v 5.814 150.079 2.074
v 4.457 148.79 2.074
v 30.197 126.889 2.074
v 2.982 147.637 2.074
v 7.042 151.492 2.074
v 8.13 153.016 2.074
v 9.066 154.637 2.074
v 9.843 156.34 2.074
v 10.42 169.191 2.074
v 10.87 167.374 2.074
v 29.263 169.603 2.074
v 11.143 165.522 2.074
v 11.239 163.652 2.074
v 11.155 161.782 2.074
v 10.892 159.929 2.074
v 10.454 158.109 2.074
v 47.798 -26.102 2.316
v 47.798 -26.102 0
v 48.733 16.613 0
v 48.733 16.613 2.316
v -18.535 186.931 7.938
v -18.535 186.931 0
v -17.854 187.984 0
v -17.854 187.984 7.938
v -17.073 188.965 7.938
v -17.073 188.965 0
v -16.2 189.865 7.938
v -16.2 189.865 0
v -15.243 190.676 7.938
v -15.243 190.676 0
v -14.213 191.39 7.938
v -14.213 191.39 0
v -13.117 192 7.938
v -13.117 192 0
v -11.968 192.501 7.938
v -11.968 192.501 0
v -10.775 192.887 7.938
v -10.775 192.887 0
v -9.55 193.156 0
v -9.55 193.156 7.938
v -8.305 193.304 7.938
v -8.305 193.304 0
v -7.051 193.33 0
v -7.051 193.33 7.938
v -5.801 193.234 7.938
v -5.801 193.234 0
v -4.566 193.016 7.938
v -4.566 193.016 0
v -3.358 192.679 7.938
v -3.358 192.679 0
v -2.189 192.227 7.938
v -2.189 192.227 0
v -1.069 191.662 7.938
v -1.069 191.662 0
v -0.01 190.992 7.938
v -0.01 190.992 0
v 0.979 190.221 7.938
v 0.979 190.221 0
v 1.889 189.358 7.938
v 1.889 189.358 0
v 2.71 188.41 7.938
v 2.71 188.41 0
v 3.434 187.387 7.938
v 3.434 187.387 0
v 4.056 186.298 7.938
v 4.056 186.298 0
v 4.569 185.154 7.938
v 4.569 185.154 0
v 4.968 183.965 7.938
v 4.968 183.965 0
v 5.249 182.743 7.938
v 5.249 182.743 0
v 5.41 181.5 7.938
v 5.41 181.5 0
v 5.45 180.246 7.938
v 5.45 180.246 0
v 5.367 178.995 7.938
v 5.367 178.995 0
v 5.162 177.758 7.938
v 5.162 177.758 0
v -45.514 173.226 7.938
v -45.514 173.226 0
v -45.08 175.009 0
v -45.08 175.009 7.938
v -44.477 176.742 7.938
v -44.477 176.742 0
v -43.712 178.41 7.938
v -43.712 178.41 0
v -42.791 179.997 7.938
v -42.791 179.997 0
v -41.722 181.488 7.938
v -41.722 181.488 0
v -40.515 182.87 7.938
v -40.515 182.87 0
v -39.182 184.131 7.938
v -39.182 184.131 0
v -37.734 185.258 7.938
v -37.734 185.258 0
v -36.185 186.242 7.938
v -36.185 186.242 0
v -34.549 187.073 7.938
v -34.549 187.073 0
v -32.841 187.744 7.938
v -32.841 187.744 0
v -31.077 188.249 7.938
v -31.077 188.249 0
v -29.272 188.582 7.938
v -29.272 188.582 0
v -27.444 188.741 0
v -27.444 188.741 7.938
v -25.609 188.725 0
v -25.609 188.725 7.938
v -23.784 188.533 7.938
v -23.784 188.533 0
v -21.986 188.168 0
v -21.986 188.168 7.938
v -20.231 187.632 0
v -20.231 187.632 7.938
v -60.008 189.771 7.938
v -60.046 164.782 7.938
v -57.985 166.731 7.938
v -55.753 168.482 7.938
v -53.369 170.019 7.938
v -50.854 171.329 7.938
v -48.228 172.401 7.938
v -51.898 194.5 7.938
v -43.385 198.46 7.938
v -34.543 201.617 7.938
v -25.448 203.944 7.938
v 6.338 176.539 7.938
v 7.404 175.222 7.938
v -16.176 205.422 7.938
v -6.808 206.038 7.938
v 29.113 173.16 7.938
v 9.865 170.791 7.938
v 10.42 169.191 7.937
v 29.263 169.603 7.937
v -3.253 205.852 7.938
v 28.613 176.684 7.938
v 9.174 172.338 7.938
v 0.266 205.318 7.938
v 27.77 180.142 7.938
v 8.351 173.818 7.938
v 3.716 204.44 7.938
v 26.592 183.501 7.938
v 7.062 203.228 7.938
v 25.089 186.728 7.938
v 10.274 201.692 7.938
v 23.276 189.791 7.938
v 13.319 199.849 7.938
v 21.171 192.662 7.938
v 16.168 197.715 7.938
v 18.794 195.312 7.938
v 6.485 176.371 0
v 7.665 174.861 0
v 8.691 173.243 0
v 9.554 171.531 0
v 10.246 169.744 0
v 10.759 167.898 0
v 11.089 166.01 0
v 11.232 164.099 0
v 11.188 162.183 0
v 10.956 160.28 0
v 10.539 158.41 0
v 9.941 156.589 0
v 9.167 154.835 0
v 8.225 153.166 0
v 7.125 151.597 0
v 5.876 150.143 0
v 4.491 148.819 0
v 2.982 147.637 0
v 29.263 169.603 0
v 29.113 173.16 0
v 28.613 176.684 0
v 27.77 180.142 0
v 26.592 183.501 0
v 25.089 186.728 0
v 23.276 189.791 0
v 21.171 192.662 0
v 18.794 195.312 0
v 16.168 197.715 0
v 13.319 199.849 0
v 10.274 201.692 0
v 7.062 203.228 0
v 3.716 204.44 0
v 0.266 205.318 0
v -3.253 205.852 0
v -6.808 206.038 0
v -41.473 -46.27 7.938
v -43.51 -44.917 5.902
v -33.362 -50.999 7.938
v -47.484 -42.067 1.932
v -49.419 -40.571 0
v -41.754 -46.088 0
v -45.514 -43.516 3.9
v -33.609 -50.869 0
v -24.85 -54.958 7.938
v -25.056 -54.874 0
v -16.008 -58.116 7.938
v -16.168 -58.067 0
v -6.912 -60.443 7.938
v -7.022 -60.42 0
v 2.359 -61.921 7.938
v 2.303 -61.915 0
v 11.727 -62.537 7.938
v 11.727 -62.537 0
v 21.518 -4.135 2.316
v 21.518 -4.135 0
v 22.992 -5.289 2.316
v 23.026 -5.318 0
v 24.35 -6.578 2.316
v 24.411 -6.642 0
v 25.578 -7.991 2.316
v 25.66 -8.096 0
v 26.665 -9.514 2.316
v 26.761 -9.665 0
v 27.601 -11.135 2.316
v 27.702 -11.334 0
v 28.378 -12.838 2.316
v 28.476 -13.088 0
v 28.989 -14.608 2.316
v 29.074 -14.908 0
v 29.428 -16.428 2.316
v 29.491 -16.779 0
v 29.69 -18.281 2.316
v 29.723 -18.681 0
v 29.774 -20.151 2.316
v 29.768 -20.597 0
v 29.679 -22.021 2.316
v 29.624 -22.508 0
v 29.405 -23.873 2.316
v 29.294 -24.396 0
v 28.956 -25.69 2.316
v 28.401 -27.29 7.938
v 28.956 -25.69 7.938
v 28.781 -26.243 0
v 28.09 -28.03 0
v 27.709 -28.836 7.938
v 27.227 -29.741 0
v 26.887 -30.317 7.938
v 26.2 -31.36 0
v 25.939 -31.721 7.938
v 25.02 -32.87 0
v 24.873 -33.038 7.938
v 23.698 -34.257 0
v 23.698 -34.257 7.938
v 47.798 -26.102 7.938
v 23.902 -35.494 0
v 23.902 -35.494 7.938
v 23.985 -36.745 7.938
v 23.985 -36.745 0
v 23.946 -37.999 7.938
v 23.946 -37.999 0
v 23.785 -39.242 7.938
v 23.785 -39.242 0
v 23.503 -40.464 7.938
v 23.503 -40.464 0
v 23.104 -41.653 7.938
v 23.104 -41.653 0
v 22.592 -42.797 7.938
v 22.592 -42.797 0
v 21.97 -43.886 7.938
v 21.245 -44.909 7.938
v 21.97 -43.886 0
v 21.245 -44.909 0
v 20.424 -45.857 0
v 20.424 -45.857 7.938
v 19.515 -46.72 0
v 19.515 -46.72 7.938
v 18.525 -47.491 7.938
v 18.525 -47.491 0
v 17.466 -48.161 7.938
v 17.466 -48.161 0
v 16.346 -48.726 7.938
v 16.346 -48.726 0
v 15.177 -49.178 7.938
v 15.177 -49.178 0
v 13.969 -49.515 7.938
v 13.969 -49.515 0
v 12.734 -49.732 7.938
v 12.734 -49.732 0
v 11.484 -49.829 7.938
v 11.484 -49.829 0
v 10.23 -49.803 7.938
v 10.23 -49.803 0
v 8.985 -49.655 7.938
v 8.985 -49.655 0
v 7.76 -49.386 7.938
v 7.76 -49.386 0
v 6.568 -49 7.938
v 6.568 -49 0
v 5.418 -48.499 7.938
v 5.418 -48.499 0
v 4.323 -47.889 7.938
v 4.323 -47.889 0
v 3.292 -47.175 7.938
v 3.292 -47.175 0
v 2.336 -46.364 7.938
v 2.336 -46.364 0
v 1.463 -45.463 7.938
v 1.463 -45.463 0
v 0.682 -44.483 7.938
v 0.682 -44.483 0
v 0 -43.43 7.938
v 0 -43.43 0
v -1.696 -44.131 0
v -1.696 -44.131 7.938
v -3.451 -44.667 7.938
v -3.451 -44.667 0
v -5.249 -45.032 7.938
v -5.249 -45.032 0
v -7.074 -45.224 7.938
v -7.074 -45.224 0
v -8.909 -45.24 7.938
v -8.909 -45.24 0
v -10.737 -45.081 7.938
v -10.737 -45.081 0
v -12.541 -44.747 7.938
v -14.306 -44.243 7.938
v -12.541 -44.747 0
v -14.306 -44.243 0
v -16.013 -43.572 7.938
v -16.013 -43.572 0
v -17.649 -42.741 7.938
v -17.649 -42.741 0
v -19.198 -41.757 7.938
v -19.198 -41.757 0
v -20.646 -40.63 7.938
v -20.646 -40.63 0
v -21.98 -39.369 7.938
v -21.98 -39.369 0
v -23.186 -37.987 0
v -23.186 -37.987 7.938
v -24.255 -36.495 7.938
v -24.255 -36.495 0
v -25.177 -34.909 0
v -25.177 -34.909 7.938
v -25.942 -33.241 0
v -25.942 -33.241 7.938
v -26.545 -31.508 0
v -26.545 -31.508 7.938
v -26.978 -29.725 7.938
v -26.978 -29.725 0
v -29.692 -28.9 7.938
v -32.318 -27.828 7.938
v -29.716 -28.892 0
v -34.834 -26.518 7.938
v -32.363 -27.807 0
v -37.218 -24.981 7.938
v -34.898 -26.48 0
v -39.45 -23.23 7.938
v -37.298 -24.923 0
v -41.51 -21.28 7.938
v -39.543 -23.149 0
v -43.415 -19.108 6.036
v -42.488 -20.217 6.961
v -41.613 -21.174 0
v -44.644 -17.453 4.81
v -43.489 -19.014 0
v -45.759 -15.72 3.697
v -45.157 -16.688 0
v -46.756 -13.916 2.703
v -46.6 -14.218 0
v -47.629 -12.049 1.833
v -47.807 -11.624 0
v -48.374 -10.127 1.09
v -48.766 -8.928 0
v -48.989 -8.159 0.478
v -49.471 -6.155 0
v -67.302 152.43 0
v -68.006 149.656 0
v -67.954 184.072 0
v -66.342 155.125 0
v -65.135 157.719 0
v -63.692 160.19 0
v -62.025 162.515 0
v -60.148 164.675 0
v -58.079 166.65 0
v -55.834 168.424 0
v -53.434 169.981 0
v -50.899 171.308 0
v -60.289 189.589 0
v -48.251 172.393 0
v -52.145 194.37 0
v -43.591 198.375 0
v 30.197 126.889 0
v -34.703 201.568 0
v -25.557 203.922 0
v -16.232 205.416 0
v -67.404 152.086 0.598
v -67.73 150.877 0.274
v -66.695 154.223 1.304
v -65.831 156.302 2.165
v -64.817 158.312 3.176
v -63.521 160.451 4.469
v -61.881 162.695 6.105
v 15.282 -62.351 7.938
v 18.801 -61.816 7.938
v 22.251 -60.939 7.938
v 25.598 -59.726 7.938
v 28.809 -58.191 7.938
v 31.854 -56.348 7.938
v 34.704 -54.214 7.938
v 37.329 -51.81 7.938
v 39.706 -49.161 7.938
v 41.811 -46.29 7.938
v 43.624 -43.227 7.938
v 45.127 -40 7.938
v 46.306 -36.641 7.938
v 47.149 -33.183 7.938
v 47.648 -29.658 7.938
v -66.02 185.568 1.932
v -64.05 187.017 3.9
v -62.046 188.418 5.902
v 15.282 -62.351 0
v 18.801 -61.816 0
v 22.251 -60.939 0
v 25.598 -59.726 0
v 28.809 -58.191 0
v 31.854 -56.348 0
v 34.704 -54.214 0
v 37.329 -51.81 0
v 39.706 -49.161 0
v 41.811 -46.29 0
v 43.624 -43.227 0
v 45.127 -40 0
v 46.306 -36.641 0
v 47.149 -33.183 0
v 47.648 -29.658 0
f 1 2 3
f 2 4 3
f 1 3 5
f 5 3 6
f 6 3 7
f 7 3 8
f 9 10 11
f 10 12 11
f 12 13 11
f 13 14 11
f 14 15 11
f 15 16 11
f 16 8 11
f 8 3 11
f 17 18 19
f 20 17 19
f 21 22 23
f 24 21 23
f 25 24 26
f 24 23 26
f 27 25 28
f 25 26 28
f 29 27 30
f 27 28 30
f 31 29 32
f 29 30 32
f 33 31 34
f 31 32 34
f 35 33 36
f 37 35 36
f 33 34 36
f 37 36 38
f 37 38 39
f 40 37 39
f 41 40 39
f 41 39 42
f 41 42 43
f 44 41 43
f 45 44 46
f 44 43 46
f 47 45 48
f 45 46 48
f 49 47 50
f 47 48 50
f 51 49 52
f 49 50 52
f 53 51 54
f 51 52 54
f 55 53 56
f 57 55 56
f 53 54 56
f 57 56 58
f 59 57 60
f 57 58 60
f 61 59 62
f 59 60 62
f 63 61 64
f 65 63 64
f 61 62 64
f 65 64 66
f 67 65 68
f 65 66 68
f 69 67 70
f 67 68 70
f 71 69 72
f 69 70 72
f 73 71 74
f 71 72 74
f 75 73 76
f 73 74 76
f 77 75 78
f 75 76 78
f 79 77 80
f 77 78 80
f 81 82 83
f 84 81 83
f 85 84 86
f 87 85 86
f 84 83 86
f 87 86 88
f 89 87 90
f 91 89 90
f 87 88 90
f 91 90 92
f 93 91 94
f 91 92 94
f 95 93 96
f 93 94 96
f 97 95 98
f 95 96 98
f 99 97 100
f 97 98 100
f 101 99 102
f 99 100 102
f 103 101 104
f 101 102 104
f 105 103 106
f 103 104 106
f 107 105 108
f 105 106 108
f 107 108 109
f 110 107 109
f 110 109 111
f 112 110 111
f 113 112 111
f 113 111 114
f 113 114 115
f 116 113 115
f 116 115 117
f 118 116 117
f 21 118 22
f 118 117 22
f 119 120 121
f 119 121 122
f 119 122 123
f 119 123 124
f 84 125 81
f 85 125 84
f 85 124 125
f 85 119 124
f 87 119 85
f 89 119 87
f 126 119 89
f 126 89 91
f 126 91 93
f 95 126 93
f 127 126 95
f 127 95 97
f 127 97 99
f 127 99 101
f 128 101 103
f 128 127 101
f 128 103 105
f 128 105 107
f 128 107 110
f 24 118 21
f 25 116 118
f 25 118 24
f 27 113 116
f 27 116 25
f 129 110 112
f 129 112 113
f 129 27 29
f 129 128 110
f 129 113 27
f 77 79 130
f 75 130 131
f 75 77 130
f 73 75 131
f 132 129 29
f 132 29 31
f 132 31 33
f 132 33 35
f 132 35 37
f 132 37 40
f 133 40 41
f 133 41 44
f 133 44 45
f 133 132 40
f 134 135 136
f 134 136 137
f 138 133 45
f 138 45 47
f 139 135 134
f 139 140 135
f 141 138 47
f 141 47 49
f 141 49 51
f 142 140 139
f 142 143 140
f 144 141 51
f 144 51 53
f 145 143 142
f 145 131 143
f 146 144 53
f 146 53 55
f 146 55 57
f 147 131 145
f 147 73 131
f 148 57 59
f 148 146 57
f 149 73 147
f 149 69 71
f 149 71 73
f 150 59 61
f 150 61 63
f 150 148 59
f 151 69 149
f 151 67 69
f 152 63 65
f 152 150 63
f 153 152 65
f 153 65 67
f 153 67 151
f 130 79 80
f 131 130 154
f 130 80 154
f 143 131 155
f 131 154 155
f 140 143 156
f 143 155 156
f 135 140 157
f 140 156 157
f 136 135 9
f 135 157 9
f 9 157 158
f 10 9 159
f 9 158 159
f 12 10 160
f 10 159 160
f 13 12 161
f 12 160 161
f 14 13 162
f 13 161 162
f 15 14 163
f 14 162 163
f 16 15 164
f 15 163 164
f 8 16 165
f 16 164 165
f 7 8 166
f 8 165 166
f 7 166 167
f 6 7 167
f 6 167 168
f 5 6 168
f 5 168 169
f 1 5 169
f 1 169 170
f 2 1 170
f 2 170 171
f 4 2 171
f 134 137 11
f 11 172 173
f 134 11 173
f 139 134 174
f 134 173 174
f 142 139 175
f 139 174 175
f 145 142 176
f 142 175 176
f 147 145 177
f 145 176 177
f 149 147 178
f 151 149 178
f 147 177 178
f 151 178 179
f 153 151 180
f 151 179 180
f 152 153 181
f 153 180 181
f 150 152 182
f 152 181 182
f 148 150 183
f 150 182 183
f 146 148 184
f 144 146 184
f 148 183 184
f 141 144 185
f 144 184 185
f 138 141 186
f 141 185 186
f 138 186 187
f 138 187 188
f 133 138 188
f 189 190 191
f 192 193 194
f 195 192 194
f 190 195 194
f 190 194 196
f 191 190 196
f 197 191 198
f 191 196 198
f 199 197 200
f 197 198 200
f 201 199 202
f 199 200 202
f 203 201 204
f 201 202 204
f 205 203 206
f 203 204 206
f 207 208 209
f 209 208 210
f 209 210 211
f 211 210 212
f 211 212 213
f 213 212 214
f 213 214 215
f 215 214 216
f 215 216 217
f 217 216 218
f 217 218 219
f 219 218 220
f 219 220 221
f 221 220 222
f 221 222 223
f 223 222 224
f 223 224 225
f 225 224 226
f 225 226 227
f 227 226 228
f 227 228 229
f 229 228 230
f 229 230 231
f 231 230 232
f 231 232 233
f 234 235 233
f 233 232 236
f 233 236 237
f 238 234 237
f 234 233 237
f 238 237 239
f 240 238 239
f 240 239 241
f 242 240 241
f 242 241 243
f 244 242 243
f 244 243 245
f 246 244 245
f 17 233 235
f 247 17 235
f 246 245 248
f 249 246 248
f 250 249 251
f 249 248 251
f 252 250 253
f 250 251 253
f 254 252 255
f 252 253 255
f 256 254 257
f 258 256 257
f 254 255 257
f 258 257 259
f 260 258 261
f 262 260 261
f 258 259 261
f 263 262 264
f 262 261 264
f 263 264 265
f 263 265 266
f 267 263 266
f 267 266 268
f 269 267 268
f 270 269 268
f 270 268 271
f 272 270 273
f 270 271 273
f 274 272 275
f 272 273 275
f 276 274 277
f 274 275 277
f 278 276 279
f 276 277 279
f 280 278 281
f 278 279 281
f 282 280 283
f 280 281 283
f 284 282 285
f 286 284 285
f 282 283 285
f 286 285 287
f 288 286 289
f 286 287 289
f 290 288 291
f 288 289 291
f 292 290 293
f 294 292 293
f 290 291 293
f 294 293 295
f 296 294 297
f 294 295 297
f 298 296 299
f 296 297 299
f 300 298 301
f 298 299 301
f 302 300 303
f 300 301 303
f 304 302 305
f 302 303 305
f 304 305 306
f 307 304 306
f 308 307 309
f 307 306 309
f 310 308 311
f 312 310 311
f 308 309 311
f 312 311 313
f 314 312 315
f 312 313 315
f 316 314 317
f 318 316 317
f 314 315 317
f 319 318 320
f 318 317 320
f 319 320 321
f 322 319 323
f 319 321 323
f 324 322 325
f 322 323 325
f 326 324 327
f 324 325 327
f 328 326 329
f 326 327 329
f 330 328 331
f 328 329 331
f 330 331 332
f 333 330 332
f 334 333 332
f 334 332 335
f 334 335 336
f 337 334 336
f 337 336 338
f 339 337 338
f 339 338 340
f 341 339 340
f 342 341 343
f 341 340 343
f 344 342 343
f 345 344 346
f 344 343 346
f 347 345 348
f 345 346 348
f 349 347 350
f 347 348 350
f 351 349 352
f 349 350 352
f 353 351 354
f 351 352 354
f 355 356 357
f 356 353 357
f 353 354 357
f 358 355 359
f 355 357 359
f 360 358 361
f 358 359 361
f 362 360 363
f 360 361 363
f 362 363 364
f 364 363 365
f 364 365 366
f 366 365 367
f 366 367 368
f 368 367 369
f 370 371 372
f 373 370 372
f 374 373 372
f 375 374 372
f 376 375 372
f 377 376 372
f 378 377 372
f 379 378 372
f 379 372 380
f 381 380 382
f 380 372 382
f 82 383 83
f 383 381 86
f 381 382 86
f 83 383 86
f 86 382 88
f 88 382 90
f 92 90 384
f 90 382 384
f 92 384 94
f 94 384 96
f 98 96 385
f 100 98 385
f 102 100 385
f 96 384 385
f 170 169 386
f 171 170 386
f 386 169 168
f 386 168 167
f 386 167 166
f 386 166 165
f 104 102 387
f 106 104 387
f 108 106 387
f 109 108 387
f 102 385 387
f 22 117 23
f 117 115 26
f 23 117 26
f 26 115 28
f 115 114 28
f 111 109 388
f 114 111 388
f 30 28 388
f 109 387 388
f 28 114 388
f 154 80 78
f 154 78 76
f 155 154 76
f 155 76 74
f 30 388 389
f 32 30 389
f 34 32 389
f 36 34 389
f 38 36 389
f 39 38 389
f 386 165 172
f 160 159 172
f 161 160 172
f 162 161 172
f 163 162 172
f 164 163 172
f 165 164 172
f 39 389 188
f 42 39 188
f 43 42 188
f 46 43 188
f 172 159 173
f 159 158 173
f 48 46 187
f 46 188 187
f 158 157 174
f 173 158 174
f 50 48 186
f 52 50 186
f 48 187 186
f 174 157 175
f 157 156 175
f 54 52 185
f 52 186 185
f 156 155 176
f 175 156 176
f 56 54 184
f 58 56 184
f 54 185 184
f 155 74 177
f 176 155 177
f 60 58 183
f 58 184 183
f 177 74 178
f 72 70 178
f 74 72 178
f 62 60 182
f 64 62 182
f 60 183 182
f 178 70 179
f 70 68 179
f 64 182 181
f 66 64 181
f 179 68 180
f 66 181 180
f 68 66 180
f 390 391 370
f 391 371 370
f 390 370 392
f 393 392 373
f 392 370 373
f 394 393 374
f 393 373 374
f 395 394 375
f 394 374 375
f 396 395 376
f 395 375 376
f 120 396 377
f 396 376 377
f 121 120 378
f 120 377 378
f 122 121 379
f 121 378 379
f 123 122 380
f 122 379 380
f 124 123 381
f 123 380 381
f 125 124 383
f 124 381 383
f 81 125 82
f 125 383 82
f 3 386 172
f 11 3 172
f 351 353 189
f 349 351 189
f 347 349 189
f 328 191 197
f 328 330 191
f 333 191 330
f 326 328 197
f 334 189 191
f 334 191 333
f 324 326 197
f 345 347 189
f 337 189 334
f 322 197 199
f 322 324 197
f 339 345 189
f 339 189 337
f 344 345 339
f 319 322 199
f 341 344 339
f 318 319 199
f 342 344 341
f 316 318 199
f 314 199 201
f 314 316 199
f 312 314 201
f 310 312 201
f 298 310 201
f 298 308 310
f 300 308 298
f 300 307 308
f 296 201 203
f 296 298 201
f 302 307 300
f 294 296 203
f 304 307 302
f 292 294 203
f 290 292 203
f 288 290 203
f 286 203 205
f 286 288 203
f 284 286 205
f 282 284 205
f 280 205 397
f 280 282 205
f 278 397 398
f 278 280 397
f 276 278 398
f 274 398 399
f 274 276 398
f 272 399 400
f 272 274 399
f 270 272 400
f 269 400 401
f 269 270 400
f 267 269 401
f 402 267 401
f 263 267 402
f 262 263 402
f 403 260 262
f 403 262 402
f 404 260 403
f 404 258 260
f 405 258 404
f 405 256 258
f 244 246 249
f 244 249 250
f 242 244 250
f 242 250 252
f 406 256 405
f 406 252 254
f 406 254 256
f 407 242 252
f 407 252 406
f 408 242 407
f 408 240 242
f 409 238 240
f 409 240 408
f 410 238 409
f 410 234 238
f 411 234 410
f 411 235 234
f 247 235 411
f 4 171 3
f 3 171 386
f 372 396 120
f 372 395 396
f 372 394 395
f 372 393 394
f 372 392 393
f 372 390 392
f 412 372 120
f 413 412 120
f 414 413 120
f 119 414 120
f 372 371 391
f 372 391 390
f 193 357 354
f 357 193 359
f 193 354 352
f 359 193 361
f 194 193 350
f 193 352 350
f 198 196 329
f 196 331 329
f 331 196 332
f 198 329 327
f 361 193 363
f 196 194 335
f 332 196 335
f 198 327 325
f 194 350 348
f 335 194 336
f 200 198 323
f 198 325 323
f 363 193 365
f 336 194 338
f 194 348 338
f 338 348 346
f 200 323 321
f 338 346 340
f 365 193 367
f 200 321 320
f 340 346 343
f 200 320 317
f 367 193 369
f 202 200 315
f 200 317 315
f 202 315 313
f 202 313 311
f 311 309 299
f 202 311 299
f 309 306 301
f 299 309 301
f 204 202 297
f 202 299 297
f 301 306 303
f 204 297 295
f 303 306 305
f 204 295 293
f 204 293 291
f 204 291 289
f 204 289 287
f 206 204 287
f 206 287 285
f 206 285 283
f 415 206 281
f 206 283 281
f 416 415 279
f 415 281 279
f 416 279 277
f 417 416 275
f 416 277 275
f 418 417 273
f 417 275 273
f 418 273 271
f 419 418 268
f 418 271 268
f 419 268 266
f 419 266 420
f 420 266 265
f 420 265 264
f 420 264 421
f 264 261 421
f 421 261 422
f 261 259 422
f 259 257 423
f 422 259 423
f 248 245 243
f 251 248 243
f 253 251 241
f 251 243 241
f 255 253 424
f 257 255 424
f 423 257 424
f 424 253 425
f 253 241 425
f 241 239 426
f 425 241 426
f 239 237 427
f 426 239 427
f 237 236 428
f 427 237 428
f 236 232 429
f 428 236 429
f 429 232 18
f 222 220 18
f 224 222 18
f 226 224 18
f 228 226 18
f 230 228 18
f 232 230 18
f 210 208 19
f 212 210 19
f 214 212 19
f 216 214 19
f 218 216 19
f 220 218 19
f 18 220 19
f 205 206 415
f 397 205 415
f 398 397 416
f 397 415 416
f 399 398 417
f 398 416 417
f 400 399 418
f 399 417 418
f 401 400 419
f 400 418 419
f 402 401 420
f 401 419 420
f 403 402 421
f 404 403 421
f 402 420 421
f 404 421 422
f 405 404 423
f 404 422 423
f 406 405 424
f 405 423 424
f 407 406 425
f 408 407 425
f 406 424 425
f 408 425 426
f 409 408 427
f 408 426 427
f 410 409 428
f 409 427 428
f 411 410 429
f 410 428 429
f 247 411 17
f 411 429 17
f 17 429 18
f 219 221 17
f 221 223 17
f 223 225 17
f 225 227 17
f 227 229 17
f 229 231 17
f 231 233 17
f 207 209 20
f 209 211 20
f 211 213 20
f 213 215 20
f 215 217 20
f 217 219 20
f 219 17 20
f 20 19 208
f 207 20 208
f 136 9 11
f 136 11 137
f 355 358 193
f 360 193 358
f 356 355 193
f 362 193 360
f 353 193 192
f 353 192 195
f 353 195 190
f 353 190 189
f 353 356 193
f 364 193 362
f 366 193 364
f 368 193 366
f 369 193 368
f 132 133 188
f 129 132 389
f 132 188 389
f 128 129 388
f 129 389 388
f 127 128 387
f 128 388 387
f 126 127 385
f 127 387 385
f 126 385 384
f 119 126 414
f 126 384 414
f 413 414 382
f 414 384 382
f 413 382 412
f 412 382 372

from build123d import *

# Parameters (mm, degrees)
F1_DEPTH    = 7.9375
F3_DEPTH    = 7.9375
F4_T1_DEPTH = 89.6707225602
F5_T1_DEPTH = 89.6707225602
F6_W        = 42.724798455
F6_H        = 5.6216642056
F7_DEPTH    = 27.68579
F8_W        = 42.724798455
F8_H        = 5.8633778039
F9_DEPTH    = 27.94


# Not quite as in the source:
# - a fillet or chamfer that OpenCascade refuses, or shapes differently, is made with other operations: its cross-section is extruded or revolved along the edge and cut away or added
# - a length typed as a fraction of an inch, garbled in the dataset ("3 / 203.2 mm" for 3/8 in), is restored


with BuildPart() as f1:
    # F0 (on Top) → F1 (new body)
    with BuildSketch(Plane.XY):
        with BuildLine():
            ThreePointArc((-49.4316077378, -40.5605532146), (-20.6567184189, -56.5706012946), (11.7271985223, -62.5369920277))
            ThreePointArc((11.7271985223, -62.5369920277), (37.3293245519, -51.810465344), (47.798260752, -26.1019335546))
            Line((47.798260752, -26.1019335546), (48.7327455768, 16.612644064))
            Line((48.7327455768, 16.612644064), (21.5177623814, -4.1354143294))
            ThreePointArc((21.5177623814, -4.1354143294), (29.7231324258, -18.6812958766), (23.6975439262, -34.2570157889))
            ThreePointArc((23.6975439262, -34.2570157889), (15.7671543171, -48.9661744477), (0, -43.4301765663))
            ThreePointArc((0, -43.4301765663), (-16.8413888709, -43.1760896289), (-26.9784570219, -29.7248150211))
            ThreePointArc((-26.9784570219, -29.7248150211), (-41.6350091938, -21.1503252784), (-49.4833397007, -6.0924335212))
            Line((-49.4833397007, -6.0924335212), (-49.4316077378, -40.5605532146))
        make_face()
    extrude(amount=F1_DEPTH)

    # F4: chamfer of 7.9502 on 1 edges, made by hand

    # F4_s2 → F4_t1 (cut)
    with BuildSketch(Plane(origin=(-0.0431333008, 28.7389786103, 0), x_dir=(0, 0, 1), z_dir=(0.0015008624, -0.9999988737, 0))):
        Polygon((-0.0127, 49.4924278722), (7.9375, 41.5422278722), (7.9375, 49.4924278722), align=None)
    extrude(amount=F4_T1_DEPTH, mode=Mode.SUBTRACT)

    # F6 (on face) → F7 (cut)
    with BuildSketch(Plane(origin=(48.3461642406, -1.0576894198, 0), x_dir=(0.021872188, 0.9997607751, 0), z_dir=(0.9997607751, -0.021872188, 0))):
        with Locations((-3.6878375481, 5.1266678972)):
            Rectangle(F6_W, F6_H)
    extrude(amount=-F7_DEPTH, mode=Mode.SUBTRACT)


with BuildPart() as f3:
    # F2 (on Top) → F3 (new body)
    with BuildSketch(Plane.XY):
        with BuildLine():
            ThreePointArc((-45.513824769, 173.2260384447), (-35.376756618, 186.6773130525), (-18.5353677471, 186.9313999898))
            ThreePointArc((-18.5353677471, 186.9313999898), (-2.76821343, 192.4673978713), (5.1621761791, 177.7582392125))
            ThreePointArc((5.1621761791, 177.7582392125), (11.1877646787, 162.1825193002), (2.9823946343, 147.6366377529))
            Line((2.9823946343, 147.6366377529), (30.1973778297, 126.8885793596))
            Line((30.1973778297, 126.8885793596), (29.2628930049, 169.6031569781))
            ThreePointArc((29.2628930049, 169.6031569781), (18.7939568048, 195.3116887676), (-6.8081692248, 206.0382154513))
            ThreePointArc((-6.8081692248, 206.0382154513), (-39.192086166, 200.0718247182), (-67.9669754849, 184.0617766382))
            Line((-67.9669754849, 184.0617766382), (-68.0187074477, 149.5936569448))
            ThreePointArc((-68.0187074477, 149.5936569448), (-60.1703769409, 164.651548702), (-45.513824769, 173.2260384447))
        make_face()
    extrude(amount=F3_DEPTH)

    # F5: chamfer of 7.9502 on 1 edges, made by hand

    # F5_s2 → F5_t1 (cut)
    with BuildSketch(Plane(origin=(0.306783709, 204.4047241236, 0), x_dir=(0, 0, 1), z_dir=(-0.0015008624, -0.9999988737, 0))):
        Polygon((-0.0127, 68.2431503326), (7.9375, 60.2929503326), (7.9375, 68.2431503326), align=None)
    extrude(amount=F5_T1_DEPTH, mode=Mode.SUBTRACT)

    # F8 (on face) → F9 (cut)
    with BuildSketch(Plane(origin=(32.9575985639, 0.7210272801, 0), x_dir=(-0.021872188, 0.9997607751, 0), z_dir=(0.9997607751, 0.021872188, 0))):
        with Locations((147.5601409515, 5.005811098)):
            Rectangle(F8_W, F8_H)
    extrude(amount=-F9_DEPTH, mode=Mode.SUBTRACT)


solid = Compound([f1.part, f3.part])
